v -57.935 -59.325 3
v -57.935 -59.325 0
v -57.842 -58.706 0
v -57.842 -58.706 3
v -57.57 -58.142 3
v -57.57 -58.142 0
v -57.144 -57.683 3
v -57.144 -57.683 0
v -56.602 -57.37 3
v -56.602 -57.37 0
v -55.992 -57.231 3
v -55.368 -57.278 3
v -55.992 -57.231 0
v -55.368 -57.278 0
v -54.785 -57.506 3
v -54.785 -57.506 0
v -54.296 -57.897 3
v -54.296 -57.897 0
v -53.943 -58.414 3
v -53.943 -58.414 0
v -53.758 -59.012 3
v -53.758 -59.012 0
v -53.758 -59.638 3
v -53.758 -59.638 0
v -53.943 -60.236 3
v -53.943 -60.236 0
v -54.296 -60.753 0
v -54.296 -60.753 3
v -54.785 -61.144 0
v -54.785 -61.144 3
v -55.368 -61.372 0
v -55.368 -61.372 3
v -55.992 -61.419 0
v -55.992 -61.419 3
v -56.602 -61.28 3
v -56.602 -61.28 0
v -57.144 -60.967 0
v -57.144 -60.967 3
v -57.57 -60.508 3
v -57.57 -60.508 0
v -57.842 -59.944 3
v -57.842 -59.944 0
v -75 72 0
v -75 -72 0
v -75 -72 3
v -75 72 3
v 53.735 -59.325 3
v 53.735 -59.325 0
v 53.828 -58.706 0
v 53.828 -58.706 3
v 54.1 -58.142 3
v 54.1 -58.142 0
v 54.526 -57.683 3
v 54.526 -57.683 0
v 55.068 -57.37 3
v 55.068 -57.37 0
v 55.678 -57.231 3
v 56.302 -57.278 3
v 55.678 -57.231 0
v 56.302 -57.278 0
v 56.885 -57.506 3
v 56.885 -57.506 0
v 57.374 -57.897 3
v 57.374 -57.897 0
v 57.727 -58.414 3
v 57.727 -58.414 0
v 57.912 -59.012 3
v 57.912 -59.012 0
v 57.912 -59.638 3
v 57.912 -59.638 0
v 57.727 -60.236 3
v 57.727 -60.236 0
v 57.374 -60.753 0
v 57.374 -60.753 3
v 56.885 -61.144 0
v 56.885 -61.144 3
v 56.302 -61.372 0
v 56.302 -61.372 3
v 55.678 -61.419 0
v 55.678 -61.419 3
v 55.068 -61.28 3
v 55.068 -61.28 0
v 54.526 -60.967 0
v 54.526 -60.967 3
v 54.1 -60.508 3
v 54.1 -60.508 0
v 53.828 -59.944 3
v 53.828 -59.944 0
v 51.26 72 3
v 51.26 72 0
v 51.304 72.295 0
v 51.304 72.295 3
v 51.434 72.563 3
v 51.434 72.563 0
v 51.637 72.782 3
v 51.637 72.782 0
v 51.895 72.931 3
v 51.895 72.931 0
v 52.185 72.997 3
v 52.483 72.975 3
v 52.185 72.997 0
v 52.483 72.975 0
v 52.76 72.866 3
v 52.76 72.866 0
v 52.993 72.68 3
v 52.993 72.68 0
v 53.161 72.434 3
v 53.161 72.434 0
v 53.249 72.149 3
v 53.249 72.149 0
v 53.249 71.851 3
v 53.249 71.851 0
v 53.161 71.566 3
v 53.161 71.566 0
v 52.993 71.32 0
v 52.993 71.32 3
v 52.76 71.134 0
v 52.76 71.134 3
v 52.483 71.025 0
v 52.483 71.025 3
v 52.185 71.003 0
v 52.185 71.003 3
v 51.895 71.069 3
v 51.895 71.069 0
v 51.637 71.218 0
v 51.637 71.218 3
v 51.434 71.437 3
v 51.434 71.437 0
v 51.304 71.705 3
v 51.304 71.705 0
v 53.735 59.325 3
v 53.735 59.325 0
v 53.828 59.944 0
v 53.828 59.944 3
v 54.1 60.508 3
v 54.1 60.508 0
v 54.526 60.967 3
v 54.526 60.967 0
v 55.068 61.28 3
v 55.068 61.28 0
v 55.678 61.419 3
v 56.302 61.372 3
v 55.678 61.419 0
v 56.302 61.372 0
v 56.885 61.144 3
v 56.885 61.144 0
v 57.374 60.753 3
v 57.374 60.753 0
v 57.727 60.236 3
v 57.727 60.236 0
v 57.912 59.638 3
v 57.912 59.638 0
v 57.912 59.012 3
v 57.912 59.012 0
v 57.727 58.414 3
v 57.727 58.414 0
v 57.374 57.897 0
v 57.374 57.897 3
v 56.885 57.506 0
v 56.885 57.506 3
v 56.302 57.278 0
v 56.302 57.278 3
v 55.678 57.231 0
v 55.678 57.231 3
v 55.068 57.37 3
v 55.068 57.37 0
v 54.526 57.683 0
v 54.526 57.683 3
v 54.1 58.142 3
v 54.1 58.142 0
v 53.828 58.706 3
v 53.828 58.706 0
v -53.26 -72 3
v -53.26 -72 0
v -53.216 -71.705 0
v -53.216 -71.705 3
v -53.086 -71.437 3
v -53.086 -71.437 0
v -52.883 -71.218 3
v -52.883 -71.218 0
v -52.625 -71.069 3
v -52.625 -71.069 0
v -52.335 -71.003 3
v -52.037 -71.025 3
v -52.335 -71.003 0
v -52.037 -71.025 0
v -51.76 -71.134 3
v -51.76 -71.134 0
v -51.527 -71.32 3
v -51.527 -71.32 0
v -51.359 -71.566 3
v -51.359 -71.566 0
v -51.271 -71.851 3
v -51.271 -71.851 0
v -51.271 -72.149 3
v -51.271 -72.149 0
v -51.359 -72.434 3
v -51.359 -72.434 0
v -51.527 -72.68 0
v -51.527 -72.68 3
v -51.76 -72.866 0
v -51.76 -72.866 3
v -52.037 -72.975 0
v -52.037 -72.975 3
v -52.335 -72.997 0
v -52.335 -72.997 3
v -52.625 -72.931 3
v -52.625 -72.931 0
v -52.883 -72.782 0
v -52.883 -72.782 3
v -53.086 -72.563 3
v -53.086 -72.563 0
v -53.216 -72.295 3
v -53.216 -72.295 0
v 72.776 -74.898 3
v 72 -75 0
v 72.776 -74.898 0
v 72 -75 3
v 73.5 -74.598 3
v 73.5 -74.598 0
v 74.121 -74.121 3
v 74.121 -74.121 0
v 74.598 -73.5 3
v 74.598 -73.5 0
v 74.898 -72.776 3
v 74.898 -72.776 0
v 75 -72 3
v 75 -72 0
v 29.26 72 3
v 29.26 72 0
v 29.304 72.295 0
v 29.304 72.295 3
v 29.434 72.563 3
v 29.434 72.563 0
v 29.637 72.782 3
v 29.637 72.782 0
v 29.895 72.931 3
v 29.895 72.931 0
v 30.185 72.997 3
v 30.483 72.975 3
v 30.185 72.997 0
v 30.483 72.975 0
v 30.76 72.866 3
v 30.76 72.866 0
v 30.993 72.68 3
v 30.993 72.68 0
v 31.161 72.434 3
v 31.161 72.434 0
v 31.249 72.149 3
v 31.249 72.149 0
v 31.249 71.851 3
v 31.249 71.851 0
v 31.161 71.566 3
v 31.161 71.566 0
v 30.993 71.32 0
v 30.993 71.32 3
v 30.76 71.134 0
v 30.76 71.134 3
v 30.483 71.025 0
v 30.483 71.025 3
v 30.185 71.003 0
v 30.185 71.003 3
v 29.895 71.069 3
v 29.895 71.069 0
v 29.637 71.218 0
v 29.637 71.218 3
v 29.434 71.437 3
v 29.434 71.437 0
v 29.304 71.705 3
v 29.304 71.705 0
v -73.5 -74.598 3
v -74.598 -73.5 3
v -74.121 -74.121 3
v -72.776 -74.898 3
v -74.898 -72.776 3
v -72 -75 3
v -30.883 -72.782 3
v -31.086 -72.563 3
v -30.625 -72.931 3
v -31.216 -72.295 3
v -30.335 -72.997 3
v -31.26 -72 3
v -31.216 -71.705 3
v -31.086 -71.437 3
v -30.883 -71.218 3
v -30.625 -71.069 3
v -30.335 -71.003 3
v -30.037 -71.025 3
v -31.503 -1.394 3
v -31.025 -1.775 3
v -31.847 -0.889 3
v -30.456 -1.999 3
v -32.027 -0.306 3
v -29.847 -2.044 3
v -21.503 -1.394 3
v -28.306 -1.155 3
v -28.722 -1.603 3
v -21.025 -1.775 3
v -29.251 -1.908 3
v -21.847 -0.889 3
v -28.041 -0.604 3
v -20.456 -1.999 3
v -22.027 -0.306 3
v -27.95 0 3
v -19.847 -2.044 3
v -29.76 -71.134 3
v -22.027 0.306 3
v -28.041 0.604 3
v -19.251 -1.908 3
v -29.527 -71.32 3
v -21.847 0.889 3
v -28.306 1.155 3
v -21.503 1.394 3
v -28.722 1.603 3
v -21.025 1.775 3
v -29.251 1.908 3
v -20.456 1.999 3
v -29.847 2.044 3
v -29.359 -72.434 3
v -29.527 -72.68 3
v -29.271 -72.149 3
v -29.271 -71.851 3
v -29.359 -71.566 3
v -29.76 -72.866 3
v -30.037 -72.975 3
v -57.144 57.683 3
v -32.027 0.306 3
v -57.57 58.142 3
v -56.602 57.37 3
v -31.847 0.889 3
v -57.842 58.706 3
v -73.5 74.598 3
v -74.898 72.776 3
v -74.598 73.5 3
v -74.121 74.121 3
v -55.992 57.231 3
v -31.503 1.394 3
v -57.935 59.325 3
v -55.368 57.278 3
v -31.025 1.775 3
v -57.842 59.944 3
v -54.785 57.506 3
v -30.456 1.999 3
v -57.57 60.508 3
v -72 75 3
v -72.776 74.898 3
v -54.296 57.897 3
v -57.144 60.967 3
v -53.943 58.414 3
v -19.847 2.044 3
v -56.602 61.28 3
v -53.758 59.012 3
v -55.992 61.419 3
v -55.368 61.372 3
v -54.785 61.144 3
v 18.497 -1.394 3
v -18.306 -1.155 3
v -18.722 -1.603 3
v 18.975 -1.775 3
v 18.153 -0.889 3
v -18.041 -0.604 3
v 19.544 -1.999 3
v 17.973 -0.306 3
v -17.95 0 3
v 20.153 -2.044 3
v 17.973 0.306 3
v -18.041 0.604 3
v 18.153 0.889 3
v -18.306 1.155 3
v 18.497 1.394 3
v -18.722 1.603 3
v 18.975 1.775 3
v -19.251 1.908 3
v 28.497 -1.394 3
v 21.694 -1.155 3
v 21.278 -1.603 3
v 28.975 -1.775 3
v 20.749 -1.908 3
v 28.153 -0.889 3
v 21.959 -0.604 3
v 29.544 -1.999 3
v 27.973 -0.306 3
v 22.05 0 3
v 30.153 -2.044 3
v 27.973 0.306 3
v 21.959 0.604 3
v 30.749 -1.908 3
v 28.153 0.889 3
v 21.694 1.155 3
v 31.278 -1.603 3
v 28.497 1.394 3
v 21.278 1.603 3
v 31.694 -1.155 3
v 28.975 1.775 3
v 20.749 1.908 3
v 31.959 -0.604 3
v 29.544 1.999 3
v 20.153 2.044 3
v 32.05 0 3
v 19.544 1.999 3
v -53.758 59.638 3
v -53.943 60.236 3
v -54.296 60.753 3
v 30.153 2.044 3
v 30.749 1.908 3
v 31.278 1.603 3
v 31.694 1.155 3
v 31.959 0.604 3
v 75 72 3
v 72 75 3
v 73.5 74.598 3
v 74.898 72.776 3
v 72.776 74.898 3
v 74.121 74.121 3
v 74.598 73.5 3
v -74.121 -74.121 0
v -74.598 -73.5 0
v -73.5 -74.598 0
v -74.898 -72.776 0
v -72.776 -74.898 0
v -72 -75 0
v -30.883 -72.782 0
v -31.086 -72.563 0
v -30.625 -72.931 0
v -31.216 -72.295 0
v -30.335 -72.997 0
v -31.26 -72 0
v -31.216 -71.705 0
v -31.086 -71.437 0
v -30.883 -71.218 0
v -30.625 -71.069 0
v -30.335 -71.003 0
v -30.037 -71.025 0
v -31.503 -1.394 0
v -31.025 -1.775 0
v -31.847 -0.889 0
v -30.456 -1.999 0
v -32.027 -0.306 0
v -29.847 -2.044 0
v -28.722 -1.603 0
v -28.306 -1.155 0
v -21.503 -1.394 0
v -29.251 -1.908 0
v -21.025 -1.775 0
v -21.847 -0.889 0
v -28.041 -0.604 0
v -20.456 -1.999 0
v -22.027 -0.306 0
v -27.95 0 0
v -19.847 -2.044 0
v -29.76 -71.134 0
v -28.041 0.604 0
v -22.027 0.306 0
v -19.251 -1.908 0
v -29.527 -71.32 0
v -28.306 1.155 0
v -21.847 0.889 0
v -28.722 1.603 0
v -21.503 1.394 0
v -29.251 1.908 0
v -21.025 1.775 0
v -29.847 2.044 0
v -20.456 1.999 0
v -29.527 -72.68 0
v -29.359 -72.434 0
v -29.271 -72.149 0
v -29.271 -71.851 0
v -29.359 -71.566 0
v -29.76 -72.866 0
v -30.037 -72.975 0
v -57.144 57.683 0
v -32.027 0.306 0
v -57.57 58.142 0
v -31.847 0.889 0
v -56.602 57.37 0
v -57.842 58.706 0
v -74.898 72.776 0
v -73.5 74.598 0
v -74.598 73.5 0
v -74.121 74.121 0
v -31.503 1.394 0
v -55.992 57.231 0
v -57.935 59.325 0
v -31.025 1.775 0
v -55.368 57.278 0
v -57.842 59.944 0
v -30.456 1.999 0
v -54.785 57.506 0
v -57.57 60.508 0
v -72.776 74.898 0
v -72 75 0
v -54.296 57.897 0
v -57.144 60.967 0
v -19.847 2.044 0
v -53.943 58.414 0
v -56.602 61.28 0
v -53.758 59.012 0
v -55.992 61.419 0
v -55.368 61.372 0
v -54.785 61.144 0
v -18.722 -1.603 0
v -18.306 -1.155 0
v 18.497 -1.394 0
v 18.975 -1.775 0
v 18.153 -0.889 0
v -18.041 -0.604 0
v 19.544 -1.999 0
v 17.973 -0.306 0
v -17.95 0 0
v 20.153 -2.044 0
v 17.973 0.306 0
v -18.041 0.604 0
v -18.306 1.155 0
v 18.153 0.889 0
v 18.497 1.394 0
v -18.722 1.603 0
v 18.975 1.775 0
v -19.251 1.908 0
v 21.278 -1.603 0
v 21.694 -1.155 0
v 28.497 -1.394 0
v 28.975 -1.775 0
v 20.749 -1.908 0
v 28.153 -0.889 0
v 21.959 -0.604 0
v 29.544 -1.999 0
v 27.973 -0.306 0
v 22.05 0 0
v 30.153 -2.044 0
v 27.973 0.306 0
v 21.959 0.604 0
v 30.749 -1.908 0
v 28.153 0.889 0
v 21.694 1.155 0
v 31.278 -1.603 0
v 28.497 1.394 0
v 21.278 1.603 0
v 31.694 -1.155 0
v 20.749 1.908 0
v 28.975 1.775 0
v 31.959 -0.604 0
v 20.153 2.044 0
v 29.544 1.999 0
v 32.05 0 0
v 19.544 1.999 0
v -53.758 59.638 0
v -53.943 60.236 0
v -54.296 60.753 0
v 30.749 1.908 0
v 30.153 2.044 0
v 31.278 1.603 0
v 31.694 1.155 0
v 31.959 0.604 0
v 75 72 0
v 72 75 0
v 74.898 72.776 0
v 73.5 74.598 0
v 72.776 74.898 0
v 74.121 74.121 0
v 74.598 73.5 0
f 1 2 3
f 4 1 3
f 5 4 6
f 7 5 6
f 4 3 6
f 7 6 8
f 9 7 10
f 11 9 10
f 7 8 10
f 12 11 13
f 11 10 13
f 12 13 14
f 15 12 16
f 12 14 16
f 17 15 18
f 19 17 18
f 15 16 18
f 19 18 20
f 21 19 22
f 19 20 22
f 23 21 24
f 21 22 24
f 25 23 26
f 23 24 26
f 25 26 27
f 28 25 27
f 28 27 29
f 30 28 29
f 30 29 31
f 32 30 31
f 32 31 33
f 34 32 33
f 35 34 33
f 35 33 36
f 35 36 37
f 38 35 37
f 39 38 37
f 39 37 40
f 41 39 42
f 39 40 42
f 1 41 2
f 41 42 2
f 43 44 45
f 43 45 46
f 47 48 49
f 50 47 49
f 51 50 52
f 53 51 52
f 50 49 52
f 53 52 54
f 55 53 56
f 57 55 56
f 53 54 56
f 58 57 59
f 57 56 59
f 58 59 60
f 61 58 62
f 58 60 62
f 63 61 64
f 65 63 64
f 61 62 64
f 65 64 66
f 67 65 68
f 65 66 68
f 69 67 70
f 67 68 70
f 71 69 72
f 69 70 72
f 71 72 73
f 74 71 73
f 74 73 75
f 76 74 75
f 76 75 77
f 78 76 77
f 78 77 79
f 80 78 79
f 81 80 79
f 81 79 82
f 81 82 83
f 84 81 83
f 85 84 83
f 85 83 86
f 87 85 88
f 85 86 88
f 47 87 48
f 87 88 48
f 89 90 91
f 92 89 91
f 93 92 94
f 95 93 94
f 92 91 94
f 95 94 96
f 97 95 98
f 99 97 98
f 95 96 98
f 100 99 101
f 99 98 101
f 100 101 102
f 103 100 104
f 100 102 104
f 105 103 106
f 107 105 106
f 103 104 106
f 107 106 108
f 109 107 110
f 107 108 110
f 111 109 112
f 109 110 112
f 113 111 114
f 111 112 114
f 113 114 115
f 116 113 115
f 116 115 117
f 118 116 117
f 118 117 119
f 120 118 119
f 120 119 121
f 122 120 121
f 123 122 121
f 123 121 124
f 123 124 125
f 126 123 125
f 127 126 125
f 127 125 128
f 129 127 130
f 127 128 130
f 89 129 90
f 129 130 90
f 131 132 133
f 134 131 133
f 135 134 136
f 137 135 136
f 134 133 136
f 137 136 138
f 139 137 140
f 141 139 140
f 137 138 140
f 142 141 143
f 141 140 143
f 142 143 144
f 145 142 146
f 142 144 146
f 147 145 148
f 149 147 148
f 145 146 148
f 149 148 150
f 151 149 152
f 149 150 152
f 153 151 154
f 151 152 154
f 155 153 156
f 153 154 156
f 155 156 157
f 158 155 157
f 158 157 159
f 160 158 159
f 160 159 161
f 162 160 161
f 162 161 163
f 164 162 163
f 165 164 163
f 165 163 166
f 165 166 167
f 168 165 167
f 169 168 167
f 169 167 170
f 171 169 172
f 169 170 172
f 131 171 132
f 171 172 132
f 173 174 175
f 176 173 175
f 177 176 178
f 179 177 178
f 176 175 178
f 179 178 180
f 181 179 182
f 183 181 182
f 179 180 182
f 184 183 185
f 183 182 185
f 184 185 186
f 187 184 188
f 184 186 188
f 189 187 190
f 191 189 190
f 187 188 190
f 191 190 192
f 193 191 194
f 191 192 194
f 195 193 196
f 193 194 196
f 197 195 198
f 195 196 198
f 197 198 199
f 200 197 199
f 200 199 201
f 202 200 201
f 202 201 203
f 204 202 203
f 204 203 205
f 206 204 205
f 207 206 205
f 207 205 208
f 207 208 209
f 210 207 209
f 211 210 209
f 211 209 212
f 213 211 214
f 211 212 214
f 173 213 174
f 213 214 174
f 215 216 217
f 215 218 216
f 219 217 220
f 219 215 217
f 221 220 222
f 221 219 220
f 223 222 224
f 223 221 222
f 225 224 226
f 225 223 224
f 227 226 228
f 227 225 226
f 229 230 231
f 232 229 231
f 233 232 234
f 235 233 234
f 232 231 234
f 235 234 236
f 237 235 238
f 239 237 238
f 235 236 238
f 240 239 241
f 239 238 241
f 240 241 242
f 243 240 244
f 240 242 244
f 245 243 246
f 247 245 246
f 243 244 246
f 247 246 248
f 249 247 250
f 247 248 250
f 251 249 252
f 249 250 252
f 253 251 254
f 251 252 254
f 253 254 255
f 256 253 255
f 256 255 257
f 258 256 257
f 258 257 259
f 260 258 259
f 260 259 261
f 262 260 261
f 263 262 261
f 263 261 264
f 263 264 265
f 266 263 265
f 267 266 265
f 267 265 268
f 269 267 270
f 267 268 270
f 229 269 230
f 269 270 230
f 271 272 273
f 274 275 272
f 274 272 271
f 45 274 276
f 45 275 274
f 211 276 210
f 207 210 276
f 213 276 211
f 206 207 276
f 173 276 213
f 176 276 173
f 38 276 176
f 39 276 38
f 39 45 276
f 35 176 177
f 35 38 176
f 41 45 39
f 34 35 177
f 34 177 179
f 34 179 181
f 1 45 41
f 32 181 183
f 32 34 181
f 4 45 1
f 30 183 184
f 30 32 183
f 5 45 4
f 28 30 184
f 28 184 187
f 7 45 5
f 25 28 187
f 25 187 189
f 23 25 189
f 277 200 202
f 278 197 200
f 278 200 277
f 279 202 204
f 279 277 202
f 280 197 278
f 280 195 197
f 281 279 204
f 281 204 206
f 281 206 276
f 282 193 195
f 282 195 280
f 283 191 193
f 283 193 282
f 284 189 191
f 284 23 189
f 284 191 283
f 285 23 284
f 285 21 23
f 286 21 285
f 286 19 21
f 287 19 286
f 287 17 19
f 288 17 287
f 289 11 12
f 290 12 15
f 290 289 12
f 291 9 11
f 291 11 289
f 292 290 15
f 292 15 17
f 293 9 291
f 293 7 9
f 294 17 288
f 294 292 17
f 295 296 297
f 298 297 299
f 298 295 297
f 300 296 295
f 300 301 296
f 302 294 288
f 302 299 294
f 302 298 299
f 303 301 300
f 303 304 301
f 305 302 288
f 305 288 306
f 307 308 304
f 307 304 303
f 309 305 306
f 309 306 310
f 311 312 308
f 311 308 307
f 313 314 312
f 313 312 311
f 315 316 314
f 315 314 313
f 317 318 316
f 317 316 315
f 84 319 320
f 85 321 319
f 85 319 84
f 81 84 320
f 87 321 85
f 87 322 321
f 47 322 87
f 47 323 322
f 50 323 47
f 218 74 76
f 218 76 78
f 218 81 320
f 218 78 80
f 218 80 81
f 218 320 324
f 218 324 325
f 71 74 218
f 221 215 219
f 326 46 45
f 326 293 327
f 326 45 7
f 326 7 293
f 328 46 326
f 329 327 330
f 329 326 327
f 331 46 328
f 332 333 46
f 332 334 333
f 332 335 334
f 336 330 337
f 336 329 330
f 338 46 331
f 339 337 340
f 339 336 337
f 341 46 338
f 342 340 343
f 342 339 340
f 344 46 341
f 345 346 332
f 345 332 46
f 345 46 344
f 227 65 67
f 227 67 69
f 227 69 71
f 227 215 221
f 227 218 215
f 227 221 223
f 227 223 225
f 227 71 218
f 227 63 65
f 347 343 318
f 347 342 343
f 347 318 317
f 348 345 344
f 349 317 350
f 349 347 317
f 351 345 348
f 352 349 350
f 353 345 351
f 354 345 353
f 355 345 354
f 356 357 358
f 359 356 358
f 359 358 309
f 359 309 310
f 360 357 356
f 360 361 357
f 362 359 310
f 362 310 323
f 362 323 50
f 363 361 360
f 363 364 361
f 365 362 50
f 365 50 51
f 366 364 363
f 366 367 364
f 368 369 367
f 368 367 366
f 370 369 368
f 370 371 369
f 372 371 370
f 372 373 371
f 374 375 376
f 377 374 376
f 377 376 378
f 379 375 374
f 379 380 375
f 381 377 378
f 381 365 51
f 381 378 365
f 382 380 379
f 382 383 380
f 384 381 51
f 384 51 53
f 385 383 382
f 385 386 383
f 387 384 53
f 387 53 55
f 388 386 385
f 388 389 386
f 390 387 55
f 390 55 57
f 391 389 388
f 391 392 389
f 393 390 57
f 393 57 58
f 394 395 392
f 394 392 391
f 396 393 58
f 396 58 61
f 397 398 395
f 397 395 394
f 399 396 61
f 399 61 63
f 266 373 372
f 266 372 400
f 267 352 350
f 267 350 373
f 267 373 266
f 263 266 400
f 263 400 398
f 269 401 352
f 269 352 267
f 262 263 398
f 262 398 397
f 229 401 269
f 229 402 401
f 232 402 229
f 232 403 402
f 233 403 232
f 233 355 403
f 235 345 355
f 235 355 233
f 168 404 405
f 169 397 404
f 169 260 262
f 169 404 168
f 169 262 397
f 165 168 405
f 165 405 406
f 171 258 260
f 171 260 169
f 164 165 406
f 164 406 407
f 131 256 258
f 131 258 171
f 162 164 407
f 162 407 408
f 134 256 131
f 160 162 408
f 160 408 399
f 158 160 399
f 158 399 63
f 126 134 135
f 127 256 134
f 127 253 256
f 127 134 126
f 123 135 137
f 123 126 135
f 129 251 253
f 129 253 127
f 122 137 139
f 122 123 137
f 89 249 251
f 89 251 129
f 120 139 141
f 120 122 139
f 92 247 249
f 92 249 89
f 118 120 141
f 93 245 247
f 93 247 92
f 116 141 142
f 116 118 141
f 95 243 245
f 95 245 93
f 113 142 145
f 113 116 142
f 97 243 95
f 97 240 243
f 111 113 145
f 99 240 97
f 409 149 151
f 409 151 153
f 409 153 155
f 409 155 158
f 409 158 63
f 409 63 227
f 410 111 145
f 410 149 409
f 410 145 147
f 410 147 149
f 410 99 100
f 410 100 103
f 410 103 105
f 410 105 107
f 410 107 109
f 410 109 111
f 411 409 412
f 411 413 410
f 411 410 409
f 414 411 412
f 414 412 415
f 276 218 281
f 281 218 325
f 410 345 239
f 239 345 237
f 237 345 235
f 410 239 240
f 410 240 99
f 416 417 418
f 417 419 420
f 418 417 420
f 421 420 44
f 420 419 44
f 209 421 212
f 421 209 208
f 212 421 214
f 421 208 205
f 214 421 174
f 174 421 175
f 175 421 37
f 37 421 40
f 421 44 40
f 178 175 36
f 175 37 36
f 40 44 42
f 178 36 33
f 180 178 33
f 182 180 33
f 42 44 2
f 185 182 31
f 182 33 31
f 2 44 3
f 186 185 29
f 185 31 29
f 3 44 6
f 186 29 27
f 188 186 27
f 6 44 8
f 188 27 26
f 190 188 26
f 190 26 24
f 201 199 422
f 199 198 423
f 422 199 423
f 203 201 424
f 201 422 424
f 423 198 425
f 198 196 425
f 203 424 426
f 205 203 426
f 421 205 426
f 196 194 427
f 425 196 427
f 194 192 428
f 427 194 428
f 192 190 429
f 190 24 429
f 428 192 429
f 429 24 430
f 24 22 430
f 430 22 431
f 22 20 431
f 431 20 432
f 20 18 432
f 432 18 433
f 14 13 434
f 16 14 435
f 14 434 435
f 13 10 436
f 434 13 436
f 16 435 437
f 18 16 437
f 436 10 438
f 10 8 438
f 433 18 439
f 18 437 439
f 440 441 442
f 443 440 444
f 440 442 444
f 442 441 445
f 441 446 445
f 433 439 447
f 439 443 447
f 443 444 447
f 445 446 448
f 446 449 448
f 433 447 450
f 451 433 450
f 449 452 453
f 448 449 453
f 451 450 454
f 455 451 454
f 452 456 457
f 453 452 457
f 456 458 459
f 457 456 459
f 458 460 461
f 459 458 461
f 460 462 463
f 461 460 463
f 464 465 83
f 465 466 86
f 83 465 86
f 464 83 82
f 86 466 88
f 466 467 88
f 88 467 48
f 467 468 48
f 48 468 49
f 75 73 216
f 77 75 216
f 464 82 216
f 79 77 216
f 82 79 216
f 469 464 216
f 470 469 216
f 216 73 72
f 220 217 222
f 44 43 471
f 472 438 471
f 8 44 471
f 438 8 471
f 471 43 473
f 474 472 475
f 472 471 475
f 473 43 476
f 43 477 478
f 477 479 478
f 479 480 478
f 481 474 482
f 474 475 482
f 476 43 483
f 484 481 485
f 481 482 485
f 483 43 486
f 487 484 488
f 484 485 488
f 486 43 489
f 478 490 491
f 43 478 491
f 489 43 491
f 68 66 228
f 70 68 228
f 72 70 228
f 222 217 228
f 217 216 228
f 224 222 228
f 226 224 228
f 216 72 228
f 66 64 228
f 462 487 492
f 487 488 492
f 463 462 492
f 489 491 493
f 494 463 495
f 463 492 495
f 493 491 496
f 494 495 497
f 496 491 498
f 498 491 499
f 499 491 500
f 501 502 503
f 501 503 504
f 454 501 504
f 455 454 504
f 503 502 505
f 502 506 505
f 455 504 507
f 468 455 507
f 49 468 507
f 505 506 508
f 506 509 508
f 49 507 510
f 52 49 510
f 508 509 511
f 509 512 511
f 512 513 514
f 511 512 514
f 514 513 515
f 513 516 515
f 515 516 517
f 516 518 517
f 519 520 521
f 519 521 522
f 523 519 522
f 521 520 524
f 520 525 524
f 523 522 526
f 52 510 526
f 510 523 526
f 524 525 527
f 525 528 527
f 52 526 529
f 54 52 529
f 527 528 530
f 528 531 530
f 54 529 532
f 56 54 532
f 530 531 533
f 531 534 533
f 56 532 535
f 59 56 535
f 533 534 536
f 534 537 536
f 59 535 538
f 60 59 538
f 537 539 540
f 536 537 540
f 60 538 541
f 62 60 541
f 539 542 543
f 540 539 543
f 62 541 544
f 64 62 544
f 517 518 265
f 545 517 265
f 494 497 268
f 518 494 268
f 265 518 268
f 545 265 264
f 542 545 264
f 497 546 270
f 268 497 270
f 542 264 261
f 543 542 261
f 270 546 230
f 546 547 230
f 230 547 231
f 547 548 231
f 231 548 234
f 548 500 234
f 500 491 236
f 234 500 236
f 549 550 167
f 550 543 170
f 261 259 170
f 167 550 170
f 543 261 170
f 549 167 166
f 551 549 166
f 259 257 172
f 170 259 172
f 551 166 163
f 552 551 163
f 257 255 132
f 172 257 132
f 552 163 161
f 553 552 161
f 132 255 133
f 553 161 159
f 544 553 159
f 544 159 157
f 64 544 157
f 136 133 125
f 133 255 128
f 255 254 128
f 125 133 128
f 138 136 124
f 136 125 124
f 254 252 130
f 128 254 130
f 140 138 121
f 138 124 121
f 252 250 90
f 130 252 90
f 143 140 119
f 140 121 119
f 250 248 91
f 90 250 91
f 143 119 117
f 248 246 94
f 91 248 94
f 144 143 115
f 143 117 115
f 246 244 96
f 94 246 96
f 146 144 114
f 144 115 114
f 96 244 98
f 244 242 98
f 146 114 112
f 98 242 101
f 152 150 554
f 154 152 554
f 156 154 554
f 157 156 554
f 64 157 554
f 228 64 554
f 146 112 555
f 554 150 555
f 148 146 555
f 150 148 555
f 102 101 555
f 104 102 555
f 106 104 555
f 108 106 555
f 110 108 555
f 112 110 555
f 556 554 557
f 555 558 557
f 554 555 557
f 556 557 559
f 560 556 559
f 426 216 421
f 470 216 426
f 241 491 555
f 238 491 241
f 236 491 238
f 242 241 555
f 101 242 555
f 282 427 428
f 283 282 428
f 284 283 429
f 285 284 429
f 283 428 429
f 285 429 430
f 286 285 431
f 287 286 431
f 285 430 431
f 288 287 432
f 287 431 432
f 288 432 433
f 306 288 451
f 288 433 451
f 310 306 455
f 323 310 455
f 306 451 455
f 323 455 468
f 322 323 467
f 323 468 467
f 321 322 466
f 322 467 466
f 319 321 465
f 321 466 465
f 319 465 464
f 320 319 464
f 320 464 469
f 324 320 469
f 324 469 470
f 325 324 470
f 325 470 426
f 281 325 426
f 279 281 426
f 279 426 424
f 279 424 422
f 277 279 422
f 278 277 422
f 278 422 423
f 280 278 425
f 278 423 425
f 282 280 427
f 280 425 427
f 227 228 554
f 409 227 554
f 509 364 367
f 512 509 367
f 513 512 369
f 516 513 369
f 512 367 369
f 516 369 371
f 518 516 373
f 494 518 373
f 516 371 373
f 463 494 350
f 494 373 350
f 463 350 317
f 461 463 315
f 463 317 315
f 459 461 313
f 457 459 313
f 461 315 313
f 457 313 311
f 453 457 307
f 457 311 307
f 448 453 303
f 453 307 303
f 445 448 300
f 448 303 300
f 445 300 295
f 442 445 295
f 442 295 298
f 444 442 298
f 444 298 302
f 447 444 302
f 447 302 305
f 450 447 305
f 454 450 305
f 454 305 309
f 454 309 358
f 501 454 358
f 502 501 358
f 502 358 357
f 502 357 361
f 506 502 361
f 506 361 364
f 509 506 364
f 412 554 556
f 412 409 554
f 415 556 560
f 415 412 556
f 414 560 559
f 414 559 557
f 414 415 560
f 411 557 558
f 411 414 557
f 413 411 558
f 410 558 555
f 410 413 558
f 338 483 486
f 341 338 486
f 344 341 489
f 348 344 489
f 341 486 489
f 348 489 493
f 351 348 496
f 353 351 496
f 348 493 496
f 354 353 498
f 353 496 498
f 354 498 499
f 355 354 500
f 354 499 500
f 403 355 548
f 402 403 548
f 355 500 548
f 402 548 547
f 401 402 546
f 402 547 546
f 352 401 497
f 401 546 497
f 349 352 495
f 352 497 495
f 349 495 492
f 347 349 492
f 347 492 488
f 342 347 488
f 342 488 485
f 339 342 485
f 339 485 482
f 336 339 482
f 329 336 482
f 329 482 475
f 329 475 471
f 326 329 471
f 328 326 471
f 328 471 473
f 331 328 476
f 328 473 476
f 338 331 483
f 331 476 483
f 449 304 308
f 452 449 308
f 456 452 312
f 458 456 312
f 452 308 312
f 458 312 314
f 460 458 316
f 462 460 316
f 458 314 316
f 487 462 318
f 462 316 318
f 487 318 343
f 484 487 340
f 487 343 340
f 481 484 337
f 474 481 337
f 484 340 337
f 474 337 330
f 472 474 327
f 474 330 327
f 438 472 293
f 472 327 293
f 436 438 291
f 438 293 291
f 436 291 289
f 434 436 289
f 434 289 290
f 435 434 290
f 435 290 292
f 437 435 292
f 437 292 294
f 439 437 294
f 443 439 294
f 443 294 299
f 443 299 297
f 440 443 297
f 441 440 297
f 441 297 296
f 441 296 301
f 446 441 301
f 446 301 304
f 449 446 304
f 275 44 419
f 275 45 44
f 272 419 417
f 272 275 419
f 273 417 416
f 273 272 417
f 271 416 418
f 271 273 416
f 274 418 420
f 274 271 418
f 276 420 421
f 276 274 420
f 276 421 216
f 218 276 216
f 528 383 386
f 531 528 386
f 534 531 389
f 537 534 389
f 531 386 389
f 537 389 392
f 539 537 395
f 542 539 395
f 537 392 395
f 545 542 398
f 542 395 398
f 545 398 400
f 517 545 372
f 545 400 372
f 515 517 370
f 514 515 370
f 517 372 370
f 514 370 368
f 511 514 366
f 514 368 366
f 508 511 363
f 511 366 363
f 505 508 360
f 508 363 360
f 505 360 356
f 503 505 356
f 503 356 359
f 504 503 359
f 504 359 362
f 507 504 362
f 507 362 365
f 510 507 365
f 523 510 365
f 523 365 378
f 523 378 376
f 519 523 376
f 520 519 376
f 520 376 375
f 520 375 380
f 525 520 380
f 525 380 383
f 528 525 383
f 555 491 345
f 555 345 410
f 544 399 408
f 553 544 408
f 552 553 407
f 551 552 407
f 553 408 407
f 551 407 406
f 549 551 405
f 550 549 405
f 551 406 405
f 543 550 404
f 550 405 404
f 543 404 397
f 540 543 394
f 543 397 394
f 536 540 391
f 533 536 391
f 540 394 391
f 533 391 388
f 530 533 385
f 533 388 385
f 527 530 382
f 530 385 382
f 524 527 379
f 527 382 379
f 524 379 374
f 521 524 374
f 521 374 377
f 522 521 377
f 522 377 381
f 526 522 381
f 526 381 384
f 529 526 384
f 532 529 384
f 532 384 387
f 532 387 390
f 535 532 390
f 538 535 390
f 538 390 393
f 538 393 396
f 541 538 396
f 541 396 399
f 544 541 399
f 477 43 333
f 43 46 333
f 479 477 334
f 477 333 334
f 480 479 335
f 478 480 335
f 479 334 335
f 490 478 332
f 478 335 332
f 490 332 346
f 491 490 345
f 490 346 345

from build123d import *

# Parameters (mm, degrees)
SKETCH1_W           = 150
SKETCH1_H           = 150
BOSS_EXTRUDE1_DEPTH = 3
FILLET1_R           = 3
SKETCH2_R           = 2.1
CUT_EXTRUDE1_DEPTH  = 3
SKETCH3_R           = 1
CUT_EXTRUDE2_DEPTH  = 3
CUT_EXTRUDE_1_REACH = 108.108
SKETCH_2_R          = 2.05


with BuildPart() as part:
    # Sketch1 → Boss-Extrude1 (new body)
    with BuildSketch(Plane.XY):
        Rectangle(SKETCH1_W, SKETCH1_H)
    extrude(amount=BOSS_EXTRUDE1_DEPTH)

    # Fillet1
    fillet1_edges = [part.edges().sort_by_distance(p)[0] for p in [
        (75, -75, 1.5),
        (-75, -75, 1.5),
        (-75, 75, 1.5),
        (75, 75, 1.5),
    ]]
    fillet(fillet1_edges, radius=FILLET1_R)

    # Sketch2 → Cut-Extrude1 (cut)
    with BuildSketch(Plane(origin=(0, 0, 0), x_dir=(-1, 0, 0), z_dir=(0, 0, -1))):
        with Locations((-55.835, 59.325)):
            Circle(SKETCH2_R)
        with Locations((55.835, 59.325)):
            Circle(SKETCH2_R)
        with Locations((-55.835, -59.325)):
            Circle(SKETCH2_R)
        with Locations((55.835, -59.325)):
            Circle(SKETCH2_R)
    extrude(amount=-CUT_EXTRUDE1_DEPTH, mode=Mode.SUBTRACT)

    # Sketch3 → Cut-Extrude2 (cut)
    with BuildSketch(Plane(origin=(0, 0, 0), x_dir=(-1, 0, 0), z_dir=(0, 0, -1))):
        with Locations((-52.26, 72)):
            Circle(SKETCH3_R)
        with Locations((-30.26, 72)):
            Circle(SKETCH3_R)
        with Locations((52.26, -72)):
            Circle(SKETCH3_R)
        with Locations((30.26, -72)):
            Circle(SKETCH3_R)
    extrude(amount=-CUT_EXTRUDE2_DEPTH, mode=Mode.SUBTRACT)

    # 草图2 → 切除-拉伸1 (cut, up to next)
    with BuildSketch(Plane.XY.offset(3), mode=Mode.PRIVATE) as cut_extrude_1_sk1:
        with Locations((-30, 0)):
            Circle(SKETCH_2_R)
    cut_extrude_1_tool1 = extrude(cut_extrude_1_sk1.sketch, amount=-CUT_EXTRUDE_1_REACH, mode=Mode.PRIVATE) & part.part
    # 草图2 → 切除-拉伸1 (cut, up to next)
    with BuildSketch(Plane.XY.offset(3), mode=Mode.PRIVATE) as cut_extrude_1_sk2:
        with Locations((-20, 0)):
            Circle(SKETCH_2_R)
    cut_extrude_1_tool2 = extrude(cut_extrude_1_sk2.sketch, amount=-CUT_EXTRUDE_1_REACH, mode=Mode.PRIVATE) & part.part
    # 草图2 → 切除-拉伸1 (cut, up to next)
    with BuildSketch(Plane.XY.offset(3), mode=Mode.PRIVATE) as cut_extrude_1_sk3:
        with Locations((30, 0)):
            Circle(SKETCH_2_R)
    cut_extrude_1_tool3 = extrude(cut_extrude_1_sk3.sketch, amount=-CUT_EXTRUDE_1_REACH, mode=Mode.PRIVATE) & part.part
    # 草图2 → 切除-拉伸1 (cut, up to next)
    with BuildSketch(Plane.XY.offset(3), mode=Mode.PRIVATE) as cut_extrude_1_sk4:
        with Locations((20, 0)):
            Circle(SKETCH_2_R)
    cut_extrude_1_tool4 = extrude(cut_extrude_1_sk4.sketch, amount=-CUT_EXTRUDE_1_REACH, mode=Mode.PRIVATE) & part.part
    add(cut_extrude_1_tool1.solids().sort_by_distance((-30, 0, 3))[0], mode=Mode.SUBTRACT)
    add(cut_extrude_1_tool2.solids().sort_by_distance((-20, 0, 3))[0], mode=Mode.SUBTRACT)
    add(cut_extrude_1_tool3.solids().sort_by_distance((30, 0, 3))[0], mode=Mode.SUBTRACT)
    add(cut_extrude_1_tool4.solids().sort_by_distance((20, 0, 3))[0], mode=Mode.SUBTRACT)


solid = part.part
